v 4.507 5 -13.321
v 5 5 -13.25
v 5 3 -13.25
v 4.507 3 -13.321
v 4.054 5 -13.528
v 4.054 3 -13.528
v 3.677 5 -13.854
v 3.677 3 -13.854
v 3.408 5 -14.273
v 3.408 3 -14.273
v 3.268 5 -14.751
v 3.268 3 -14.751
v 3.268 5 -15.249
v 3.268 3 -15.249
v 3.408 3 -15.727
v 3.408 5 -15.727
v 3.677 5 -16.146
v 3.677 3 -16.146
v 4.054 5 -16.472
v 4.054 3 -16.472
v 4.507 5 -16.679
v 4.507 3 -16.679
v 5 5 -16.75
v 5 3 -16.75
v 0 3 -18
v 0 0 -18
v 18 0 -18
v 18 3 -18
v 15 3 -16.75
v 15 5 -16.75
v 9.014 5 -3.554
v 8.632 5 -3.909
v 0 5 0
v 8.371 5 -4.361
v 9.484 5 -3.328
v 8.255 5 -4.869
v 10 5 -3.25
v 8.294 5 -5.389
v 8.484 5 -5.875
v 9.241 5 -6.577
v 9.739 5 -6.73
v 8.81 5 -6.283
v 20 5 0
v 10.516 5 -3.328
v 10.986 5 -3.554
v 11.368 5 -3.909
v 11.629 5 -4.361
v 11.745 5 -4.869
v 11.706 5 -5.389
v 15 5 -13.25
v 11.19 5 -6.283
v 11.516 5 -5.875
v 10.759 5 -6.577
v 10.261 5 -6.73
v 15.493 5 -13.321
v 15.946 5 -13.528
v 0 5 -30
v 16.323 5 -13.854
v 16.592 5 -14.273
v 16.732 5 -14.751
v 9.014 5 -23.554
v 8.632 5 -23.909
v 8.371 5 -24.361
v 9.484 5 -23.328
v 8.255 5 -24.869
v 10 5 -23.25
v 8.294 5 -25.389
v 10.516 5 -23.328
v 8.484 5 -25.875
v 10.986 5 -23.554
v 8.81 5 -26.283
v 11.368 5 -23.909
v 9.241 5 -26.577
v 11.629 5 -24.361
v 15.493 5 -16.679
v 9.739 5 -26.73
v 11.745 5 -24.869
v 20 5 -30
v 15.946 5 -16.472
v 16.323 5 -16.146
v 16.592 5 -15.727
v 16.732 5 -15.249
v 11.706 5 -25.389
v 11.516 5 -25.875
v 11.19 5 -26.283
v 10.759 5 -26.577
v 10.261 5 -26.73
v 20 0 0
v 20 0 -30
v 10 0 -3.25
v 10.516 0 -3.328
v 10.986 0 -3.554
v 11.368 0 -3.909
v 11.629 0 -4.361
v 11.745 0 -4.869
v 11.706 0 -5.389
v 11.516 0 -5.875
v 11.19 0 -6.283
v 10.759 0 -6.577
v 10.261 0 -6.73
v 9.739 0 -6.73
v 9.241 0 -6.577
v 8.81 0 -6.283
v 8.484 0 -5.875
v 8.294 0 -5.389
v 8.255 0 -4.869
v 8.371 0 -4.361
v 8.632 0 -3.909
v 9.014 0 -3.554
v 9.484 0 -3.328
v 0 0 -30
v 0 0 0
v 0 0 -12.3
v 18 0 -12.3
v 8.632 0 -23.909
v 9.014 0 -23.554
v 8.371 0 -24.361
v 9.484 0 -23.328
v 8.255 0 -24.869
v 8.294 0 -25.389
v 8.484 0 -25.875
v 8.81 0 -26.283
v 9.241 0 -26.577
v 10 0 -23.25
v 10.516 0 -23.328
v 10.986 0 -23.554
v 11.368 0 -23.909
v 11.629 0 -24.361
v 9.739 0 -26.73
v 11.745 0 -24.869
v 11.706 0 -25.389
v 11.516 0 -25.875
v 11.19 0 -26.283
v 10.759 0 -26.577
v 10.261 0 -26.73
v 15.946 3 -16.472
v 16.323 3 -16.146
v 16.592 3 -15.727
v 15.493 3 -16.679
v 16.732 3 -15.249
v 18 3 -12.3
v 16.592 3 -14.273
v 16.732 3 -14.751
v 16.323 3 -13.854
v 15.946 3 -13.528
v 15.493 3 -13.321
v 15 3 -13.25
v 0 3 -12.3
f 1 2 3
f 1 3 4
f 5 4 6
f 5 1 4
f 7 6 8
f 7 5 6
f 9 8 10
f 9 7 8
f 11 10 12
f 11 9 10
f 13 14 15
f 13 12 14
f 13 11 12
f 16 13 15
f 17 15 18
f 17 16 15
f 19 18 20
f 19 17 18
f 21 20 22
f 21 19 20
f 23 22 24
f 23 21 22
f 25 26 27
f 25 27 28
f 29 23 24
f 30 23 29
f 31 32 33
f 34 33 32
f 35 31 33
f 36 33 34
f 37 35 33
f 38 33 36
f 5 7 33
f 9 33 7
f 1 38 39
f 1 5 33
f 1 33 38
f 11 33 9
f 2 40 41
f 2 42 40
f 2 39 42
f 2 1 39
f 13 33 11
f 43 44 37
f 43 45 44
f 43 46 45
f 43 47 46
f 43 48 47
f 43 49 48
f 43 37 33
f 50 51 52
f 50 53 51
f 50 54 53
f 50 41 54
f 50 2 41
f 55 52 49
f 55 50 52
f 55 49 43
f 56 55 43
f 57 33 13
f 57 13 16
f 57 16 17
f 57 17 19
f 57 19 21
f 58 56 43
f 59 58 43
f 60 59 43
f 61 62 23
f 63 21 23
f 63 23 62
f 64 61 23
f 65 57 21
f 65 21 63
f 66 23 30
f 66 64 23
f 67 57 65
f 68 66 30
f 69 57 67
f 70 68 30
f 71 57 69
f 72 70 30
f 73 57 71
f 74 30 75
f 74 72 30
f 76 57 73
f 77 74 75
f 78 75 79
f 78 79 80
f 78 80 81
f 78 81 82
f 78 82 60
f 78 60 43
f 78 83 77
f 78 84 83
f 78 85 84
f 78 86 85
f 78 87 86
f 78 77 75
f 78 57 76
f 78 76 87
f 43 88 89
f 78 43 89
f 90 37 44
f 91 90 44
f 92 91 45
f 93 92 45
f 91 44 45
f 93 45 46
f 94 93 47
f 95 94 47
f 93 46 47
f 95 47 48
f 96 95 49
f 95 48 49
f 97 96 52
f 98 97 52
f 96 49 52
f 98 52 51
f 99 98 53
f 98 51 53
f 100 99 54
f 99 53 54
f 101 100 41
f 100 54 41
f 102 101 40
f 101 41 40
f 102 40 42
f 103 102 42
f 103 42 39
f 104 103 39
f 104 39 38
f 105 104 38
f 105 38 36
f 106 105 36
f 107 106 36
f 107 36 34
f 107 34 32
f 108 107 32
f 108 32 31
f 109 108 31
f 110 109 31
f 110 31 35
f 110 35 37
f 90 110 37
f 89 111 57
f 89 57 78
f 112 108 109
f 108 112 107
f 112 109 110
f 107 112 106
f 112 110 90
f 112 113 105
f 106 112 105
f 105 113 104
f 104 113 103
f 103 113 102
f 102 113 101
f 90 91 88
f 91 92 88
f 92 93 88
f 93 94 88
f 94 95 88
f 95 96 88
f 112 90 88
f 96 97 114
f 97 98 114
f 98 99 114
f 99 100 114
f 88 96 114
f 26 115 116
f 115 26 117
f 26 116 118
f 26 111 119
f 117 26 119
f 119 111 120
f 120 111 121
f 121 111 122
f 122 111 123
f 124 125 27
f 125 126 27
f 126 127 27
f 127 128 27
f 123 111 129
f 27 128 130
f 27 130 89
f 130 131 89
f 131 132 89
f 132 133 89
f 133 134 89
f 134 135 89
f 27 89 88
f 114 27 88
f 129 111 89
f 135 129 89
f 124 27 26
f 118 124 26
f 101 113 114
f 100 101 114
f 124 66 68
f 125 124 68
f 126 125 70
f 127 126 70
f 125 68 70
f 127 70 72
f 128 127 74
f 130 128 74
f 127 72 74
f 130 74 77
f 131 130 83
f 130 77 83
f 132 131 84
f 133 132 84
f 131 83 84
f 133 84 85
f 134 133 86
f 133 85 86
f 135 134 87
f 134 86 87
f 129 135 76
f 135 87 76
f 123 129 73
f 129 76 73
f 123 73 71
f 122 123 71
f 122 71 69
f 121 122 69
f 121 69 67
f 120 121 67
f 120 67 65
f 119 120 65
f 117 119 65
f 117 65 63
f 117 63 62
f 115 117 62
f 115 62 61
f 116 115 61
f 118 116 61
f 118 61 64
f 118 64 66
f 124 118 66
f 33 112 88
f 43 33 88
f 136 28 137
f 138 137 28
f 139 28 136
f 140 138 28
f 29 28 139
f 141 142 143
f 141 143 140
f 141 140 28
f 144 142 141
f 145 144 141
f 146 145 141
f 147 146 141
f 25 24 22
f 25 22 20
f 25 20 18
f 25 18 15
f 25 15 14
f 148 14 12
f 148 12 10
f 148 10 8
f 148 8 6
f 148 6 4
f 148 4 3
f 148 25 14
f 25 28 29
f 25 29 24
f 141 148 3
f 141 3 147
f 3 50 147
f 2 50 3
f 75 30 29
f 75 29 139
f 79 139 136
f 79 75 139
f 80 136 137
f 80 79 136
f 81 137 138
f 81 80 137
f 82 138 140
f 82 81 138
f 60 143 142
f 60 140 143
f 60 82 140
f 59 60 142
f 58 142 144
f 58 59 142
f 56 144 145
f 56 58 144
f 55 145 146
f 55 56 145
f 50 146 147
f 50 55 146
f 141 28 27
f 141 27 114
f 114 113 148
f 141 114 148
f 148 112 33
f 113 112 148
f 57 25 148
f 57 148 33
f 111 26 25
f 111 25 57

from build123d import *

# Parameters (mm, degrees)
SKETCH1_W           = 20
SKETCH1_H           = 30
BOSS_EXTRUDE1_DEPTH = 5
CUT_EXTRUDE1_DEPTH  = 8
SKETCH3_R           = 1.75
CUT_EXTRUDE2_DEPTH  = 37.400549446
SKETCH4_W           = 5.7
SKETCH4_H           = 3
CUT_EXTRUDE3_DEPTH  = 18


with BuildPart() as part:
    # Sketch1 → Boss-Extrude1 (new body)
    with BuildSketch(Plane(origin=(0, 0, 0), x_dir=(1, 0, 0), z_dir=(0, 1, 0))):
        with Locations((10, 15)):
            Rectangle(SKETCH1_W, SKETCH1_H)
    extrude(amount=BOSS_EXTRUDE1_DEPTH)

    # Sketch2 → Cut-Extrude1 (cut)
    with BuildSketch(Plane(origin=(0, 5, 0), x_dir=(1, 0, 0), z_dir=(0, 1, 0))):
        with BuildLine():
            Line((5, 16.75), (15, 16.75))
            ThreePointArc((15, 16.75), (16.75, 15), (15, 13.25))
            Line((15, 13.25), (5, 13.25))
            ThreePointArc((5, 13.25), (3.25, 15), (5, 16.75))
        make_face()
    extrude(amount=-CUT_EXTRUDE1_DEPTH, mode=Mode.SUBTRACT)

    # Sketch3 → Cut-Extrude2 (cut, through all)
    with BuildSketch(Plane(origin=(0, 5, 0), x_dir=(1, 0, 0), z_dir=(0, 1, 0))):
        with Locations(Location((10, 25, 0), (0, 0, 270))):
            Circle(SKETCH3_R)
        with Locations(Location((10, 5, 0), (0, 0, 270))):
            Circle(SKETCH3_R)
    extrude(amount=-CUT_EXTRUDE2_DEPTH, mode=Mode.SUBTRACT)

    # Sketch4 → Cut-Extrude3 (cut)
    with BuildSketch(Plane.ZY):
        with Locations((-15.15, 1.5)):
            Rectangle(SKETCH4_W, SKETCH4_H)
    extrude(amount=-CUT_EXTRUDE3_DEPTH, mode=Mode.SUBTRACT)


solid = part.part
